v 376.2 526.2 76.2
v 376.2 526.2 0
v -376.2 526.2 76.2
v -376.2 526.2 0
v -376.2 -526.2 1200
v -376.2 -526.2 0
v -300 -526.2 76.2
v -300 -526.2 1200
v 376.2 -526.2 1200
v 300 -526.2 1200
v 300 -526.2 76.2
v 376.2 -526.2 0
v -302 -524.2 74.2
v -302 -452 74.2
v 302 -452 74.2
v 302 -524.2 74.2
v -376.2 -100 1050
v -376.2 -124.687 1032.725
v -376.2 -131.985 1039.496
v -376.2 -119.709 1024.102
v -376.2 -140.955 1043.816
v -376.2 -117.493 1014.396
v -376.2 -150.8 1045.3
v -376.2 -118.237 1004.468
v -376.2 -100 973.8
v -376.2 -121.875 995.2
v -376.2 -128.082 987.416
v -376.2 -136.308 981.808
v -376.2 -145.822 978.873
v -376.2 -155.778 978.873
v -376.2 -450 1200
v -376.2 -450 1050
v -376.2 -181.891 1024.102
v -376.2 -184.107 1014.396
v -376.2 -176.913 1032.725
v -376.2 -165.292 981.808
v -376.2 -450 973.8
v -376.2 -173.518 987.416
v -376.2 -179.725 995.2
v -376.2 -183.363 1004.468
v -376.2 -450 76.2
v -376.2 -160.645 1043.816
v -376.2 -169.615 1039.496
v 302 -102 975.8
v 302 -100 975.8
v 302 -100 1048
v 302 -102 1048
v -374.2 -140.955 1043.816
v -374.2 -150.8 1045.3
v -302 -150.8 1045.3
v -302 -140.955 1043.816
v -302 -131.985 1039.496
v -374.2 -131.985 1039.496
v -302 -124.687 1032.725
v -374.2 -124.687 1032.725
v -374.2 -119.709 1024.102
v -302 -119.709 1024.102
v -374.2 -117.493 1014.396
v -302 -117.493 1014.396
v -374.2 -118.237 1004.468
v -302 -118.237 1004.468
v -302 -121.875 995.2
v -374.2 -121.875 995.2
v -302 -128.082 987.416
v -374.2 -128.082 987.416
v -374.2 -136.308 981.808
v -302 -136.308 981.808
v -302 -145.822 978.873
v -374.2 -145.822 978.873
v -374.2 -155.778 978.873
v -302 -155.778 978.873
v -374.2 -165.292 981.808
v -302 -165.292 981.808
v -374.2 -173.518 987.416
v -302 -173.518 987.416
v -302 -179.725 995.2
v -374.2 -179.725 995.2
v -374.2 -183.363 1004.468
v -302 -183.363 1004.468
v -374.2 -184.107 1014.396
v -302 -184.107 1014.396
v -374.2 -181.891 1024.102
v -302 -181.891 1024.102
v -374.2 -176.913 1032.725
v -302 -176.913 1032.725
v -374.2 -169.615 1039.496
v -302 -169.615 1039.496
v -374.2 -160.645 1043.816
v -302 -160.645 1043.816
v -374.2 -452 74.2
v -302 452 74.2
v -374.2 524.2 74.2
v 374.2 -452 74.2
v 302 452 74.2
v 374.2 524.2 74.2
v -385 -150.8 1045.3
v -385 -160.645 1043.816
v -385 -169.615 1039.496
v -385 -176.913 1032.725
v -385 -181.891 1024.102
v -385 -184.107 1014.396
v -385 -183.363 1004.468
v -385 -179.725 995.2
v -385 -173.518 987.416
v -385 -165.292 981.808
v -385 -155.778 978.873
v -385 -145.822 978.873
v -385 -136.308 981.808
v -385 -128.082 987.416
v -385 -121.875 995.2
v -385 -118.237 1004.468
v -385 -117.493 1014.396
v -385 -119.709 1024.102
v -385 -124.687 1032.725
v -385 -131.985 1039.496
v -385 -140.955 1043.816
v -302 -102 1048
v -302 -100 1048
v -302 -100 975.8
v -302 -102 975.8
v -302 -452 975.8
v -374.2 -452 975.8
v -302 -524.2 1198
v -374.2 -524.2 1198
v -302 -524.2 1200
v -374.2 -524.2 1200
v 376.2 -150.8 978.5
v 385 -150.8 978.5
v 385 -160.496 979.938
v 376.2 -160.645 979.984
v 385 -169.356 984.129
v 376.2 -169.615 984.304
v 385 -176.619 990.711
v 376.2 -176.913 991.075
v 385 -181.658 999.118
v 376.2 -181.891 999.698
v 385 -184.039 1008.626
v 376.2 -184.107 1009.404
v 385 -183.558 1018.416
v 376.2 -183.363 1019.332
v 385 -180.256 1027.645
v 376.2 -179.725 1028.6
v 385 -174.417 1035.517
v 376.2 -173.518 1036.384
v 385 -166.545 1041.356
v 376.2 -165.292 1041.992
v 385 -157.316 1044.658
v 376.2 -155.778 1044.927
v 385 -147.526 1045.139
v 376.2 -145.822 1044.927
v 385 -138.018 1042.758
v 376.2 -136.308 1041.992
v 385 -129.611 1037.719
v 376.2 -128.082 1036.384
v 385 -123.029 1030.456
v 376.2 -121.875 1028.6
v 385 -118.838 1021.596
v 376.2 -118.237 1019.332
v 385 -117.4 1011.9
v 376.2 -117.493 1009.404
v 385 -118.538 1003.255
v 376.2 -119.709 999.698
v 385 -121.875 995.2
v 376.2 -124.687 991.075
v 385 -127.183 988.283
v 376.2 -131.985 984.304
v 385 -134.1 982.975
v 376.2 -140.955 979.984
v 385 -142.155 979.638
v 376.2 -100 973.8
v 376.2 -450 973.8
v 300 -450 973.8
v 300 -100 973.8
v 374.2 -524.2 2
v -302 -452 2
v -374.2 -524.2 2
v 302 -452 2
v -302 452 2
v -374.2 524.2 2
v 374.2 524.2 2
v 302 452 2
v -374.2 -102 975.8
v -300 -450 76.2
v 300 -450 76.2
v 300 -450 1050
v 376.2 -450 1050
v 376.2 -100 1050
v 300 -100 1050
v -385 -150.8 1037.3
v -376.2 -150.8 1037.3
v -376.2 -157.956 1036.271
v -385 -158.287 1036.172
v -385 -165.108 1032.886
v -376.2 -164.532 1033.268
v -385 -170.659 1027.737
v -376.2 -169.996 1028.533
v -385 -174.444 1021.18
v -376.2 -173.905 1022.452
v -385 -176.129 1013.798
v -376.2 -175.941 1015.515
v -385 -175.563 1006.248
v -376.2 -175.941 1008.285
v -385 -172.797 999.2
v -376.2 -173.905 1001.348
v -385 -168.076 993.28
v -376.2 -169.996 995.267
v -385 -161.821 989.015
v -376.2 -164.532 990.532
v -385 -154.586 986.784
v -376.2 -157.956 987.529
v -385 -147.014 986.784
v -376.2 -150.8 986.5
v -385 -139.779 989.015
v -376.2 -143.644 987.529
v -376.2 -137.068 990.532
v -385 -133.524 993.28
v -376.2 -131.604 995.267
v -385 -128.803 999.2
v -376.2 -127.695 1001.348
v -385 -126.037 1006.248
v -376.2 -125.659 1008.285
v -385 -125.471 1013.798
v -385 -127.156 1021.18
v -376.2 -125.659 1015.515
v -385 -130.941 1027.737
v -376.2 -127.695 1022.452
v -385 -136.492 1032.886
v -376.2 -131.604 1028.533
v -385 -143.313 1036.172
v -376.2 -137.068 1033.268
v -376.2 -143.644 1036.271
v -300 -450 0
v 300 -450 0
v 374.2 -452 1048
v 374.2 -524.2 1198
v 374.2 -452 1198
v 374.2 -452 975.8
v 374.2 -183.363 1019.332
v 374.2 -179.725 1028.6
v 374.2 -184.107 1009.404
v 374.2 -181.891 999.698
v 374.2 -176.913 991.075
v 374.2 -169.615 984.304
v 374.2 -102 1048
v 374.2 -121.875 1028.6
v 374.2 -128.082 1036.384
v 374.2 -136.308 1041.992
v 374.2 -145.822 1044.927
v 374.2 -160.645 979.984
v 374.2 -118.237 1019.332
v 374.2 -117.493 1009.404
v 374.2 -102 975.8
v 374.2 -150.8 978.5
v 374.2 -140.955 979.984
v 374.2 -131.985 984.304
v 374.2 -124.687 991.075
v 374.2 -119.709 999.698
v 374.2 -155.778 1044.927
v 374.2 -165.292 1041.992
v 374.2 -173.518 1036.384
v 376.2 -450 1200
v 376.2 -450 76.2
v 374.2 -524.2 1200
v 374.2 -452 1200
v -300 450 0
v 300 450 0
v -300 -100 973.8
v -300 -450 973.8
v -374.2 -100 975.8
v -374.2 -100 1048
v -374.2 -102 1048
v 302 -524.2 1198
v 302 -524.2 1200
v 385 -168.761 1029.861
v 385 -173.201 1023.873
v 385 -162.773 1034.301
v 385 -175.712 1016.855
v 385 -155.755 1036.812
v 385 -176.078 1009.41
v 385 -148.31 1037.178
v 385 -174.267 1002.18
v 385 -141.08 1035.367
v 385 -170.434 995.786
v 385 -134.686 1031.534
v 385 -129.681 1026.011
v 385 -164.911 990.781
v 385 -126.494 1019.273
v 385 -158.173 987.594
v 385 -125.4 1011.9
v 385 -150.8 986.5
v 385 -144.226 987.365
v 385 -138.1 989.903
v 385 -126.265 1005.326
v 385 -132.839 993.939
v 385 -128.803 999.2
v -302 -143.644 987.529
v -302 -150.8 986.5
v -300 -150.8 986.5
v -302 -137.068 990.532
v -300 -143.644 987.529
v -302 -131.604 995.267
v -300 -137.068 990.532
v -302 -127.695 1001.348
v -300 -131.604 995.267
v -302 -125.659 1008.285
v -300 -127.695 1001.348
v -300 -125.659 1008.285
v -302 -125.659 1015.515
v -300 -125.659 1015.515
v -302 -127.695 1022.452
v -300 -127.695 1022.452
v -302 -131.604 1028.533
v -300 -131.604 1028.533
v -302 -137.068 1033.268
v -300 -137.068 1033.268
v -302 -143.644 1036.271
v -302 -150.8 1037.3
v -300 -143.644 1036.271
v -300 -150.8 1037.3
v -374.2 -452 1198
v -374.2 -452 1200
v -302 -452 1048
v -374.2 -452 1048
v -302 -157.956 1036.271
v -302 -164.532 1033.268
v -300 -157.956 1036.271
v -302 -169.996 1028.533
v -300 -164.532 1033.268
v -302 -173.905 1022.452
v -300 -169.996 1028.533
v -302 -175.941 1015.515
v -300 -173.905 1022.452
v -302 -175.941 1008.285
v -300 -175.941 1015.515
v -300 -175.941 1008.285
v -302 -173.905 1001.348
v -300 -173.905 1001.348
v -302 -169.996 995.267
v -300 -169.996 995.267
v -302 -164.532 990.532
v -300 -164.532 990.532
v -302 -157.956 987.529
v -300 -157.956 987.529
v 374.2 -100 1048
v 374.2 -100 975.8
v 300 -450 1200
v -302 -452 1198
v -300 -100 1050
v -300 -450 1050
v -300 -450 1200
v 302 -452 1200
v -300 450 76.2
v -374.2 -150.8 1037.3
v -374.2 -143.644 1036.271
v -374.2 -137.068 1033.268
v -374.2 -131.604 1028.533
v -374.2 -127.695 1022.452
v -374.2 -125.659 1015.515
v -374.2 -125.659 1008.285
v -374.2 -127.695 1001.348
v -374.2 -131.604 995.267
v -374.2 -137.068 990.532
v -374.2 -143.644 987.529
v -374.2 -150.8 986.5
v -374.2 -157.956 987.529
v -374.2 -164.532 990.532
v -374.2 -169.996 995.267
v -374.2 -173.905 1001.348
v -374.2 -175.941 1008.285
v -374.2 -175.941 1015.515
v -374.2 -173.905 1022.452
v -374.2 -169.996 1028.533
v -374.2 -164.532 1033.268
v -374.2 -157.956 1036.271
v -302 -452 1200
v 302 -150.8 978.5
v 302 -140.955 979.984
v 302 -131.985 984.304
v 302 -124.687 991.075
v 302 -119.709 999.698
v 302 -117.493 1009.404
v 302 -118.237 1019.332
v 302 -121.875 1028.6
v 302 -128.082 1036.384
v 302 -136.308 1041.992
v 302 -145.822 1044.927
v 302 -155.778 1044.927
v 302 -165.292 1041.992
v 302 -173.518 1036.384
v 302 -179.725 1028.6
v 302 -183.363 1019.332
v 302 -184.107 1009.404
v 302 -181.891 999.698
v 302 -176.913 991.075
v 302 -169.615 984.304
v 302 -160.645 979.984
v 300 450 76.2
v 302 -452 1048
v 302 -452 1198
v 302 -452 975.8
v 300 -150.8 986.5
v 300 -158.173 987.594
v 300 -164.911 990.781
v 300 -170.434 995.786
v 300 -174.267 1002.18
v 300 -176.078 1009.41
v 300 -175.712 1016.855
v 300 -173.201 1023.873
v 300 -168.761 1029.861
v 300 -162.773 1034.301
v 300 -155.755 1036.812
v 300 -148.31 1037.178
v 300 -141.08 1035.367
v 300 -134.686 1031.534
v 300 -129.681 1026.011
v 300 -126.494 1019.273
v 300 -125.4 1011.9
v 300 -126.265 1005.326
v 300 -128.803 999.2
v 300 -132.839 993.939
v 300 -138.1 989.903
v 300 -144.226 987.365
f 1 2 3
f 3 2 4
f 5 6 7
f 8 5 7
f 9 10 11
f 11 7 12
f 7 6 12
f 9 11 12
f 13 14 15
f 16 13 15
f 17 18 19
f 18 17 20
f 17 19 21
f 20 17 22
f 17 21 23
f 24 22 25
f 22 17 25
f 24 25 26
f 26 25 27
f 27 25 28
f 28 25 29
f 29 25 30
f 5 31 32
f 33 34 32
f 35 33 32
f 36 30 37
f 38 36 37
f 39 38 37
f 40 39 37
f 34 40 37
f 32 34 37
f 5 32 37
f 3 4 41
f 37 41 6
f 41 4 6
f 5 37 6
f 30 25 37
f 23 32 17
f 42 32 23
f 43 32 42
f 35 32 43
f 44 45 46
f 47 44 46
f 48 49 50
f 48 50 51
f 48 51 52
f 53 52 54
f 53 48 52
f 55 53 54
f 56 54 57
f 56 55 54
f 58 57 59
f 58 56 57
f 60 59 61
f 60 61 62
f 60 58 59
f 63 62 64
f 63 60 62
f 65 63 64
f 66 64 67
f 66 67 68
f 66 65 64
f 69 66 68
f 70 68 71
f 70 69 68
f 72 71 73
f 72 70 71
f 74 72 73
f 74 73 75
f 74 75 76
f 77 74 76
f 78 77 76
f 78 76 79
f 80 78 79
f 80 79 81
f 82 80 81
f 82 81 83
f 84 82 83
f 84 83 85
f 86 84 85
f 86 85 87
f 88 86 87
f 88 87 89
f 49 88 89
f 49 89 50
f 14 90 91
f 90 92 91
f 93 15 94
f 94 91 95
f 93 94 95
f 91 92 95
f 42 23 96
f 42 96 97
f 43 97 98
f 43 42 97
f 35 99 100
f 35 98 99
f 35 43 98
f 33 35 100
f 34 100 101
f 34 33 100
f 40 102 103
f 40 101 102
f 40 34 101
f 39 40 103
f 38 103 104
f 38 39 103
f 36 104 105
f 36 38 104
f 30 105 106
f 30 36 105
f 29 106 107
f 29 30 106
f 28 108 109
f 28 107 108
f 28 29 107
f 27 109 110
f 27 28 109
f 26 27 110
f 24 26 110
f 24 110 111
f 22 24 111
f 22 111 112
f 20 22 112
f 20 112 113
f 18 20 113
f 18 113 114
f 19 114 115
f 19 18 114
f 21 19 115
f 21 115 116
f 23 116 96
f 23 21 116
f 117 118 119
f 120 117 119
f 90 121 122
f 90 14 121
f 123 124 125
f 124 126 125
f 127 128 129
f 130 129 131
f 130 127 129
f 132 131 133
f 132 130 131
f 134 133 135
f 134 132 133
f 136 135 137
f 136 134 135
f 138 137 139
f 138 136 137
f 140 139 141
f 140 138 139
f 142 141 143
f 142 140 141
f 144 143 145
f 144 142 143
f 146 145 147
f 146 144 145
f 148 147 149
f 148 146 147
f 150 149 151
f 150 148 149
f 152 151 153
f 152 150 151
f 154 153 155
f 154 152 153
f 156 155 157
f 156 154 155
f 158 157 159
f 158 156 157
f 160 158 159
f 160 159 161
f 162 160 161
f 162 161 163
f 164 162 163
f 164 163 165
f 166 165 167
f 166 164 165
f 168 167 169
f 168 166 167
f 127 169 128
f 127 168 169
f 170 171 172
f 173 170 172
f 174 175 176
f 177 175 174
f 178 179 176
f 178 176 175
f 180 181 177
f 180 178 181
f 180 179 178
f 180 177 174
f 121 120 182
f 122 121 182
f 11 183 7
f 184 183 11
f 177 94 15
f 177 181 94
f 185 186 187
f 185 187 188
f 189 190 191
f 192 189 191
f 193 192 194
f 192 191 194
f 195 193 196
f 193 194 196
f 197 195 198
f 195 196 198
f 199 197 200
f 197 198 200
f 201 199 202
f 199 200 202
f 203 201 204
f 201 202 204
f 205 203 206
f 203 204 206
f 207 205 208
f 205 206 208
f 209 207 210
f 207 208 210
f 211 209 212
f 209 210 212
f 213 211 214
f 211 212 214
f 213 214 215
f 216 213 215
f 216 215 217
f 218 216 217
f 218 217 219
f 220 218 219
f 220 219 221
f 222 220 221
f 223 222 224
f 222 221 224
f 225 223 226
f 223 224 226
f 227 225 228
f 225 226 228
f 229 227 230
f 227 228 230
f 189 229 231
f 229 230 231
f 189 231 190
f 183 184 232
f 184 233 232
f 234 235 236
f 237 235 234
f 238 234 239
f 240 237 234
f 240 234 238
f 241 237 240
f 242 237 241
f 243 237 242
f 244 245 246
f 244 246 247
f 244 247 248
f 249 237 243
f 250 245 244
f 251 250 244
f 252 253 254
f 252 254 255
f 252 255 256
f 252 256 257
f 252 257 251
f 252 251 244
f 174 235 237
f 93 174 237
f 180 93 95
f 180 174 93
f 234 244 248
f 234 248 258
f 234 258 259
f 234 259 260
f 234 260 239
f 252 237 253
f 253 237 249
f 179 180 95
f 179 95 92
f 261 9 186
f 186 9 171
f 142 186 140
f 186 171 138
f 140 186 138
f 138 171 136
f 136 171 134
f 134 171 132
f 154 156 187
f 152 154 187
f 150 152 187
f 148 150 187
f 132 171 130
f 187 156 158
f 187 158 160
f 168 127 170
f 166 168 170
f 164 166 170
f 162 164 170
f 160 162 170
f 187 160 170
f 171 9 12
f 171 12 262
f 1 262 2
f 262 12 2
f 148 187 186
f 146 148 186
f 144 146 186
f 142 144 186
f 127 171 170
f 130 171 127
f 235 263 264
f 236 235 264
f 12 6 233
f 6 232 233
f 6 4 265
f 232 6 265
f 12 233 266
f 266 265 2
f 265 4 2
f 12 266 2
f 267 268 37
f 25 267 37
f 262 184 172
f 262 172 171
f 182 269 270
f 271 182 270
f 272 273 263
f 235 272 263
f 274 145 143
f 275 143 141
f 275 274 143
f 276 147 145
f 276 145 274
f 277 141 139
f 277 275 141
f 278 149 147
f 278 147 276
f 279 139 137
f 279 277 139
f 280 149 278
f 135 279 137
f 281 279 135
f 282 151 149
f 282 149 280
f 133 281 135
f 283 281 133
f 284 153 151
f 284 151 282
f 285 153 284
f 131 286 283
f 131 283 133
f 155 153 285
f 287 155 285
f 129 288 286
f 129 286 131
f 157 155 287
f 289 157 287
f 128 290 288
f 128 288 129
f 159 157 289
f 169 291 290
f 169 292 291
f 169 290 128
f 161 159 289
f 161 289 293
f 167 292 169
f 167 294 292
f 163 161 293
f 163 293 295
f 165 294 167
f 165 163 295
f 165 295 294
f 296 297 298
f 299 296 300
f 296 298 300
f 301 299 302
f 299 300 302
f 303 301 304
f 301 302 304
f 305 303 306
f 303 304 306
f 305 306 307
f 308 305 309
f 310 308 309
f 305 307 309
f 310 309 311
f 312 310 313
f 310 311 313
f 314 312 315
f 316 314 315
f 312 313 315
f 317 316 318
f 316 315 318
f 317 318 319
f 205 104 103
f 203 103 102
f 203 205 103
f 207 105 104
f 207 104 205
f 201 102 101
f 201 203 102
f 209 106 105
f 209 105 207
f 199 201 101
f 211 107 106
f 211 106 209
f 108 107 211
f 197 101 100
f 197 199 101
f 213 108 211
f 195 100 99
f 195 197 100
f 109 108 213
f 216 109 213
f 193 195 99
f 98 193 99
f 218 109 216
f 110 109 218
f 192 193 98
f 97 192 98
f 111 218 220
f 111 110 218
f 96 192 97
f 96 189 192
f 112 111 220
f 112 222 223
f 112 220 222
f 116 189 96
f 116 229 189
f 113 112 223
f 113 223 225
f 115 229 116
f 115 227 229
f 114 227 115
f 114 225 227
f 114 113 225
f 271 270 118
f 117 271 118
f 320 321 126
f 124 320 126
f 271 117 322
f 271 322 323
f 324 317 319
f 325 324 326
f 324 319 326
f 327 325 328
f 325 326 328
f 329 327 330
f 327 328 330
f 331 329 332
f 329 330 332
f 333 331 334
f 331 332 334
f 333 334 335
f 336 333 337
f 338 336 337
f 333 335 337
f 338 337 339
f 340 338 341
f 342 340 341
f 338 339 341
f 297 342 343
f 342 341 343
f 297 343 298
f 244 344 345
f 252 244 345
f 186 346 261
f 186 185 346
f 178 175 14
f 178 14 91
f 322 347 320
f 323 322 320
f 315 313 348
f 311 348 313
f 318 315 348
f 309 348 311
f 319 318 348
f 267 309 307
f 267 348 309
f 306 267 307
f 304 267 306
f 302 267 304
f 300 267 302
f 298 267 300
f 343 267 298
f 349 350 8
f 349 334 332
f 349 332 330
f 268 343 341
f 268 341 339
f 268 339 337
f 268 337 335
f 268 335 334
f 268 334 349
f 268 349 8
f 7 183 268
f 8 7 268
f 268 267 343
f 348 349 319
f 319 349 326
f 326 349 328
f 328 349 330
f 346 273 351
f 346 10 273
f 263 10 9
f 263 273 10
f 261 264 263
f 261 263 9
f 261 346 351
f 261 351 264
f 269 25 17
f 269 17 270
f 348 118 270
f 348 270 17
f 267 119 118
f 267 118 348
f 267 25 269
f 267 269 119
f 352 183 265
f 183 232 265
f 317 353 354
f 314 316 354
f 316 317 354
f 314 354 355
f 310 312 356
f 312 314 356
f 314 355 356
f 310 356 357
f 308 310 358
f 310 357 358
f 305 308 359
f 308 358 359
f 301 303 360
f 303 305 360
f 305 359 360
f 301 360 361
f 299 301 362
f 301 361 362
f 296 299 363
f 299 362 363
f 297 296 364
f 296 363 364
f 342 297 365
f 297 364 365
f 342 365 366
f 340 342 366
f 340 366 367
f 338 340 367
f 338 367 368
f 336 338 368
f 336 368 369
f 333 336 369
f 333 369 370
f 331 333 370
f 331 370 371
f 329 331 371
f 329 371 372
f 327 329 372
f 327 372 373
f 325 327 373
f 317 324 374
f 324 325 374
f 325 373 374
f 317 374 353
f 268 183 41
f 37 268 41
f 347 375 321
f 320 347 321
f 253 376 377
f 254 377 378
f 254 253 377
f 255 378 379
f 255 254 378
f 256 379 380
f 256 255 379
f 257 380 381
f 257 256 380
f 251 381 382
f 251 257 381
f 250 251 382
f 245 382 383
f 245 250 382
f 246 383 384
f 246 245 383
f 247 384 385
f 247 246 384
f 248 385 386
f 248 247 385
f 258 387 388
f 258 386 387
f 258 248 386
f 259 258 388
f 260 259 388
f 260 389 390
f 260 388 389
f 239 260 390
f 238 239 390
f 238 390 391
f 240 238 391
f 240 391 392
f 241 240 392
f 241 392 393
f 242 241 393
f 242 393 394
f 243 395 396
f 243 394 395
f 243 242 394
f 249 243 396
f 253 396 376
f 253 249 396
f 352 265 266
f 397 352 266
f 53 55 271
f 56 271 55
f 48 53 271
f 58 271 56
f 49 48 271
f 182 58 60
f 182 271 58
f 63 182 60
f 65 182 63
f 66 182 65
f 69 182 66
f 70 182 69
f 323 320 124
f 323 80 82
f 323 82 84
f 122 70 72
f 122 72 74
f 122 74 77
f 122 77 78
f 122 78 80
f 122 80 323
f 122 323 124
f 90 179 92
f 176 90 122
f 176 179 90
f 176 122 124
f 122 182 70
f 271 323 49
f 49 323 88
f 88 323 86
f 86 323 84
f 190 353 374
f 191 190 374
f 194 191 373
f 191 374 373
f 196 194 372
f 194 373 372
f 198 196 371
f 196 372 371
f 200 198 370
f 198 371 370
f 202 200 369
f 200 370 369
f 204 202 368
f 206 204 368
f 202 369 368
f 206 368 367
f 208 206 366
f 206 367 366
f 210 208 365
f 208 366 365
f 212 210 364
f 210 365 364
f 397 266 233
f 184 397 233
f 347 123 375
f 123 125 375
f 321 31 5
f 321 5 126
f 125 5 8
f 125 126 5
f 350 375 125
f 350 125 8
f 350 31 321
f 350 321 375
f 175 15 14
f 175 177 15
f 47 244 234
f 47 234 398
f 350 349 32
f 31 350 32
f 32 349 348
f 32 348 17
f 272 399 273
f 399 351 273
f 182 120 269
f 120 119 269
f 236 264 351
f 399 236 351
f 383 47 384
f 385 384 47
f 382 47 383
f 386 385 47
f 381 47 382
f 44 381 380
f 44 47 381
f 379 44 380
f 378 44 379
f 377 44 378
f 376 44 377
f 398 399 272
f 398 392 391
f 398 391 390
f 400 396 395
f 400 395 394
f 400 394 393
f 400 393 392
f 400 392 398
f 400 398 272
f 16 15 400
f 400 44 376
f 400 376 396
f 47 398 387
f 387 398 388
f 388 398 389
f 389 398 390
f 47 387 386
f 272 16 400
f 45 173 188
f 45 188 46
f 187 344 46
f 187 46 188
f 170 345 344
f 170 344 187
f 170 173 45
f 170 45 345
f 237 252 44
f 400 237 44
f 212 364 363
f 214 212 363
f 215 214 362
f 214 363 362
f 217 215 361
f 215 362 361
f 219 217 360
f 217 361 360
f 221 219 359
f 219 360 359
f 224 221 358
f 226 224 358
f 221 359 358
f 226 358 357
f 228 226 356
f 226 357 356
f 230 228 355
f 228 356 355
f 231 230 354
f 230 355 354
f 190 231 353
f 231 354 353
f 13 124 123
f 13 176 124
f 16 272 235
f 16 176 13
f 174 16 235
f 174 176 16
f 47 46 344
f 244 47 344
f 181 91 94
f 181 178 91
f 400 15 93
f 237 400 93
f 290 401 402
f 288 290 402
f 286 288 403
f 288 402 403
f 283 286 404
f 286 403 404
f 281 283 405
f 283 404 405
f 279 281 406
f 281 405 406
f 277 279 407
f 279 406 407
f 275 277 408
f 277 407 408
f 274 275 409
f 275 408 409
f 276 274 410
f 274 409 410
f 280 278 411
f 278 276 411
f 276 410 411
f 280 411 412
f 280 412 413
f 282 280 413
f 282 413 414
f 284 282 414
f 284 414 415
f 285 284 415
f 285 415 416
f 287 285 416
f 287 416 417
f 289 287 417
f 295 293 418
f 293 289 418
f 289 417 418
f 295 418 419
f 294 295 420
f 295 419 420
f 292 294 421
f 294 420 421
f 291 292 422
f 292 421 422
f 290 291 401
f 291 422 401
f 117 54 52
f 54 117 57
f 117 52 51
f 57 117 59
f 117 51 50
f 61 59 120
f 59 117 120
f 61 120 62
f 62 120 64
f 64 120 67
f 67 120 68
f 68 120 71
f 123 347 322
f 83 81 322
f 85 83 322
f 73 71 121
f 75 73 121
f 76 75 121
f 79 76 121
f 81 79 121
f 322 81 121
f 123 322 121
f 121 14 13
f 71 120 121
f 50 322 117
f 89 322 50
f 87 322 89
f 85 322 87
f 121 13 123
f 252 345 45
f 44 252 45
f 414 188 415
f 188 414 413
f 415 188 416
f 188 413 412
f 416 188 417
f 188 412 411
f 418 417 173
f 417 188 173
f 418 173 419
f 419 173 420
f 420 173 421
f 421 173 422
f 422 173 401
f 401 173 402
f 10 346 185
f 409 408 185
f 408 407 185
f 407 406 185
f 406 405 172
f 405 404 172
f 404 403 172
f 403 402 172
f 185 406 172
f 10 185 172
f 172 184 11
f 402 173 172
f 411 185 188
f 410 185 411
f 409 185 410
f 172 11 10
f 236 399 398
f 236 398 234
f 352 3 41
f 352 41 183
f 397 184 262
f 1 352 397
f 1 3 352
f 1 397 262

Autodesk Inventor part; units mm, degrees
ref_plane "YZ Plane" through (0, 0, 0) normal (1, 0, 0) x (0, 1, 0)
ref_plane "XZ Plane" through (0, 0, 0) normal (0, 1, 0) x (-1, 0, 0)
ref_plane "XY Plane" through (0, 0, 0) normal (0, 0, 1) x (1, 0, 0)
sketch "Boceto1" plane through (0, 0, 0) normal (0, 0, 1) x (1, 0, 0)
  line L0 (300, -450) -> (-300, -450)
  line L1 (-300, -450) -> (-300, 450)
  line L2 (-300, 450) -> (300, 450)
  line L3 (300, 450) -> (300, -450)
  line L4 (300, -450) -> (-300, 450) construction
  line L5 (-300, -450) -> (300, 450) construction
  line L6 (376.2, 526.2) -> (-376.2, 526.2)
  line L7 (-376.2, 526.2) -> (-376.2, -526.2)
  line L8 (-376.2, -526.2) -> (376.2, -526.2)
  line L9 (376.2, -526.2) -> (376.2, 526.2)
  line L10 (-300, -450) -> (-300, -526.2)
  line L11 (300, -450) -> (300, -526.2)
  line L12 (300, 450) -> (300, 526.2)
  line L13 (-300, 450) -> (-300, 526.2)
  line L14 (-300, -450) -> (-376.2, -450)
  line L15 (300, -450) -> (376.2, -450)
  point P0 (0, 0)
  dimension "d0" = 600
  dimension "d1" = 900
  dimension "d2" = 76.2
extrude "Extrusión1" add sketch "Boceto1" along normal blind 76.2 contours L11 L8 L10 L0 | L15 L9 L8 L11 | L3 L12 L6 L9 L15 | L14 L7 L6 L13 L1 | L10 L8 L7 L14 | L2 L13 L6 L12
extrude "Extrusión2" add sketch "Boceto1" along normal blind 1200 contours L15 L9 L8 L11 | L10 L8 L7 L14
sketch "Boceto2" plane through (300, -450, 76.2) normal (0, 1, 0) x (1, 0, 0)
  line L0 (76.2, 0) -> (76.2, -1123.8) projected
  line L1 (76.2, -1123.8) -> (76.2, -973.8)
  line L2 (76.2, -973.8) -> (0, -973.8)
  line L3 (0, 0) -> (0, -1123.8) projected
  line L4 (76.2, -973.8) -> (76.2, -897.6)
  line L5 (76.2, -897.6) -> (0, -897.6)
  line L6 (0, -897.6) -> (0, -973.8)
  line L7 (-600, 0) -> (-600, -1123.8) projected
  line L8 (-600, -897.6) -> (-600, -973.8)
  line L9 (-676.2, 0) -> (-676.2, -1123.8) projected
  line L10 (-676.2, -973.8) -> (-676.2, -897.6)
  line L11 (-600, -897.6) -> (-676.2, -897.6)
  line L12 (-600, -973.8) -> (-676.2, -973.8)
  point P0 (-300, 76.2)
  dimension "d7" = 150
  dimension "d8" = 76.2
extrude "Extrusión3" add sketch "Boceto2" along normal blind 350
sketch "Boceto3" plane through (376.2, -526.2, 0) normal (1, 0, 0) x (0, 0, -1)
  line L0 (0, 0) -> (0, 1052.4) projected
  line L1 (0, 1052.4) -> (-76.2, 1052.4) projected
  line L2 (-76.2, 76.2) -> (-76.2, 1052.4) projected
  line L3 (-76.2, 76.2) -> (-973.8, 76.2) projected
  line L4 (-973.8, 76.2) -> (-973.8, 426.2) projected
  line L5 (-1050, 426.2) -> (-973.8, 426.2) projected
  line L6 (-1050, 76.2) -> (-1050, 426.2) projected
  line L7 (-1050, 76.2) -> (-1200, 76.2) projected
  line L8 (-1200, 0) -> (-1200, 76.2) projected
  line L9 (0, 0) -> (-1200, 0) projected
  circle A0 centre (-1011.9, 375.4) radius 25.4
  line L10 (-1011.9, 375.4) -> (-1011.9, 426.2)
  line L11 (-973.8, 426.2) -> (-1050, 426.2) projected
  circle A1 centre (-1011.9, 375.4) radius 25.4
  circle A2 centre (-1011.9, 375.4) radius 33.4
  point P0 (0, 526.2)
  dimension "d11" = 50.8
  dimension "d12" = 50.8
  dimension "d16" = 8
extrude "Extrusión4" cut sketch "Boceto3" against normal blind 1200 contours A0
shell "Vaciado1" thickness 2 removed faces 2 at (325.4, -152.8439, 986.5824) at (-350.8, -152.8439, 986.5824)
extrude "Extrusión5" add sketch "Boceto3" against normal blind 76.2 contours A2
sketch "Boceto4" plane through (-376.2, -526.2, 0) normal (-1, 0, 0) x (0, 0, 1)
  circle A0 centre (1011.9, 375.4) radius 33.4 projected
  circle A1 centre (1011.9, 375.4) radius 25.4 projected
  point P0 (0, 526.2)
extrude "Extrusión6" add sketch "Boceto4" against normal blind 76.2
extrude "Extrusión7" add sketch "Boceto3" along normal blind 8.8 contours A2
extrude "Extrusión8" add sketch "Boceto4" along normal blind 8.8
sketch "Boceto5" plane through (376.2, -450, 973.8) normal (0, 0, -1) x (-1, 0, 0)
  point P0 (376.2, 450)
sketch "Boceto6" plane through (0, 0, 1200) normal (0, 0, 1) x (1, 0, 0)
  line L0 (374.2, -452) -> (302, -452) projected
  line L1 (302, -452) -> (302, -524.2) projected
  line L2 (374.2, -524.2) -> (374.2, -452) projected
  line L3 (302, -524.2) -> (374.2, -524.2) projected
  line L4 (300, -526.2) -> (376.2, -526.2) projected
  line L5 (300, -450) -> (300, -526.2) projected
  line L6 (300, -526.2) -> (376.2, -526.2) projected
  line L7 (376.2, -526.2) -> (376.2, -450) projected
  line L8 (376.2, -450) -> (300, -450) projected
  line L9 (-376.2, -450) -> (-376.2, -526.2) projected
  line L10 (-376.2, -526.2) -> (-300, -526.2) projected
  line L11 (-300, -526.2) -> (-300, -450) projected
  line L12 (-300, -450) -> (-376.2, -450) projected
  line L13 (-302, -452) -> (-374.2, -452) projected
  line L14 (-302, -524.2) -> (-302, -452) projected
  line L15 (-374.2, -452) -> (-374.2, -524.2) projected
  line L16 (-374.2, -524.2) -> (-302, -524.2) projected
  point P0 (0, 0)
extrude "Extrusión9" cut sketch "Boceto6" against normal blind 2 contours L2 L3 L1 L0 | L14 L16 L15 L13
sketch "Boceto7" plane through (300, -100, 76.2) normal (0, 1, 0) x (1, 0, 0)
  line L0 (-600, -973.8) -> (-600, -897.6) projected
  line L1 (-600, -897.6) -> (-676.2, -897.6) projected
  line L2 (-676.2, -897.6) -> (-676.2, -973.8) projected
  line L3 (-676.2, -973.8) -> (-600, -973.8) projected
  line L4 (-674.2, -899.6) -> (-674.2, -971.8) projected
  line L5 (-674.2, -971.8) -> (-602, -971.8) projected
  line L6 (-602, -899.6) -> (-674.2, -899.6) projected
  line L7 (-602, -971.8) -> (-602, -899.6) projected
  line L8 (0, -897.6) -> (0, -973.8) projected
  line L9 (0, -973.8) -> (76.2, -973.8) projected
  line L10 (76.2, -973.8) -> (76.2, -897.6) projected
  line L11 (76.2, -897.6) -> (0, -897.6) projected
  line L12 (2, -899.6) -> (2, -971.8) projected
  line L13 (2, -971.8) -> (74.2, -971.8) projected
  line L14 (74.2, -899.6) -> (2, -899.6) projected
  line L15 (74.2, -971.8) -> (74.2, -899.6) projected
  point P0 (-300, 76.2)
extrude "Extrusión10" cut sketch "Boceto7" against normal blind 2 contours L6 L7 L5 L4 | L14 L15 L13 L12
